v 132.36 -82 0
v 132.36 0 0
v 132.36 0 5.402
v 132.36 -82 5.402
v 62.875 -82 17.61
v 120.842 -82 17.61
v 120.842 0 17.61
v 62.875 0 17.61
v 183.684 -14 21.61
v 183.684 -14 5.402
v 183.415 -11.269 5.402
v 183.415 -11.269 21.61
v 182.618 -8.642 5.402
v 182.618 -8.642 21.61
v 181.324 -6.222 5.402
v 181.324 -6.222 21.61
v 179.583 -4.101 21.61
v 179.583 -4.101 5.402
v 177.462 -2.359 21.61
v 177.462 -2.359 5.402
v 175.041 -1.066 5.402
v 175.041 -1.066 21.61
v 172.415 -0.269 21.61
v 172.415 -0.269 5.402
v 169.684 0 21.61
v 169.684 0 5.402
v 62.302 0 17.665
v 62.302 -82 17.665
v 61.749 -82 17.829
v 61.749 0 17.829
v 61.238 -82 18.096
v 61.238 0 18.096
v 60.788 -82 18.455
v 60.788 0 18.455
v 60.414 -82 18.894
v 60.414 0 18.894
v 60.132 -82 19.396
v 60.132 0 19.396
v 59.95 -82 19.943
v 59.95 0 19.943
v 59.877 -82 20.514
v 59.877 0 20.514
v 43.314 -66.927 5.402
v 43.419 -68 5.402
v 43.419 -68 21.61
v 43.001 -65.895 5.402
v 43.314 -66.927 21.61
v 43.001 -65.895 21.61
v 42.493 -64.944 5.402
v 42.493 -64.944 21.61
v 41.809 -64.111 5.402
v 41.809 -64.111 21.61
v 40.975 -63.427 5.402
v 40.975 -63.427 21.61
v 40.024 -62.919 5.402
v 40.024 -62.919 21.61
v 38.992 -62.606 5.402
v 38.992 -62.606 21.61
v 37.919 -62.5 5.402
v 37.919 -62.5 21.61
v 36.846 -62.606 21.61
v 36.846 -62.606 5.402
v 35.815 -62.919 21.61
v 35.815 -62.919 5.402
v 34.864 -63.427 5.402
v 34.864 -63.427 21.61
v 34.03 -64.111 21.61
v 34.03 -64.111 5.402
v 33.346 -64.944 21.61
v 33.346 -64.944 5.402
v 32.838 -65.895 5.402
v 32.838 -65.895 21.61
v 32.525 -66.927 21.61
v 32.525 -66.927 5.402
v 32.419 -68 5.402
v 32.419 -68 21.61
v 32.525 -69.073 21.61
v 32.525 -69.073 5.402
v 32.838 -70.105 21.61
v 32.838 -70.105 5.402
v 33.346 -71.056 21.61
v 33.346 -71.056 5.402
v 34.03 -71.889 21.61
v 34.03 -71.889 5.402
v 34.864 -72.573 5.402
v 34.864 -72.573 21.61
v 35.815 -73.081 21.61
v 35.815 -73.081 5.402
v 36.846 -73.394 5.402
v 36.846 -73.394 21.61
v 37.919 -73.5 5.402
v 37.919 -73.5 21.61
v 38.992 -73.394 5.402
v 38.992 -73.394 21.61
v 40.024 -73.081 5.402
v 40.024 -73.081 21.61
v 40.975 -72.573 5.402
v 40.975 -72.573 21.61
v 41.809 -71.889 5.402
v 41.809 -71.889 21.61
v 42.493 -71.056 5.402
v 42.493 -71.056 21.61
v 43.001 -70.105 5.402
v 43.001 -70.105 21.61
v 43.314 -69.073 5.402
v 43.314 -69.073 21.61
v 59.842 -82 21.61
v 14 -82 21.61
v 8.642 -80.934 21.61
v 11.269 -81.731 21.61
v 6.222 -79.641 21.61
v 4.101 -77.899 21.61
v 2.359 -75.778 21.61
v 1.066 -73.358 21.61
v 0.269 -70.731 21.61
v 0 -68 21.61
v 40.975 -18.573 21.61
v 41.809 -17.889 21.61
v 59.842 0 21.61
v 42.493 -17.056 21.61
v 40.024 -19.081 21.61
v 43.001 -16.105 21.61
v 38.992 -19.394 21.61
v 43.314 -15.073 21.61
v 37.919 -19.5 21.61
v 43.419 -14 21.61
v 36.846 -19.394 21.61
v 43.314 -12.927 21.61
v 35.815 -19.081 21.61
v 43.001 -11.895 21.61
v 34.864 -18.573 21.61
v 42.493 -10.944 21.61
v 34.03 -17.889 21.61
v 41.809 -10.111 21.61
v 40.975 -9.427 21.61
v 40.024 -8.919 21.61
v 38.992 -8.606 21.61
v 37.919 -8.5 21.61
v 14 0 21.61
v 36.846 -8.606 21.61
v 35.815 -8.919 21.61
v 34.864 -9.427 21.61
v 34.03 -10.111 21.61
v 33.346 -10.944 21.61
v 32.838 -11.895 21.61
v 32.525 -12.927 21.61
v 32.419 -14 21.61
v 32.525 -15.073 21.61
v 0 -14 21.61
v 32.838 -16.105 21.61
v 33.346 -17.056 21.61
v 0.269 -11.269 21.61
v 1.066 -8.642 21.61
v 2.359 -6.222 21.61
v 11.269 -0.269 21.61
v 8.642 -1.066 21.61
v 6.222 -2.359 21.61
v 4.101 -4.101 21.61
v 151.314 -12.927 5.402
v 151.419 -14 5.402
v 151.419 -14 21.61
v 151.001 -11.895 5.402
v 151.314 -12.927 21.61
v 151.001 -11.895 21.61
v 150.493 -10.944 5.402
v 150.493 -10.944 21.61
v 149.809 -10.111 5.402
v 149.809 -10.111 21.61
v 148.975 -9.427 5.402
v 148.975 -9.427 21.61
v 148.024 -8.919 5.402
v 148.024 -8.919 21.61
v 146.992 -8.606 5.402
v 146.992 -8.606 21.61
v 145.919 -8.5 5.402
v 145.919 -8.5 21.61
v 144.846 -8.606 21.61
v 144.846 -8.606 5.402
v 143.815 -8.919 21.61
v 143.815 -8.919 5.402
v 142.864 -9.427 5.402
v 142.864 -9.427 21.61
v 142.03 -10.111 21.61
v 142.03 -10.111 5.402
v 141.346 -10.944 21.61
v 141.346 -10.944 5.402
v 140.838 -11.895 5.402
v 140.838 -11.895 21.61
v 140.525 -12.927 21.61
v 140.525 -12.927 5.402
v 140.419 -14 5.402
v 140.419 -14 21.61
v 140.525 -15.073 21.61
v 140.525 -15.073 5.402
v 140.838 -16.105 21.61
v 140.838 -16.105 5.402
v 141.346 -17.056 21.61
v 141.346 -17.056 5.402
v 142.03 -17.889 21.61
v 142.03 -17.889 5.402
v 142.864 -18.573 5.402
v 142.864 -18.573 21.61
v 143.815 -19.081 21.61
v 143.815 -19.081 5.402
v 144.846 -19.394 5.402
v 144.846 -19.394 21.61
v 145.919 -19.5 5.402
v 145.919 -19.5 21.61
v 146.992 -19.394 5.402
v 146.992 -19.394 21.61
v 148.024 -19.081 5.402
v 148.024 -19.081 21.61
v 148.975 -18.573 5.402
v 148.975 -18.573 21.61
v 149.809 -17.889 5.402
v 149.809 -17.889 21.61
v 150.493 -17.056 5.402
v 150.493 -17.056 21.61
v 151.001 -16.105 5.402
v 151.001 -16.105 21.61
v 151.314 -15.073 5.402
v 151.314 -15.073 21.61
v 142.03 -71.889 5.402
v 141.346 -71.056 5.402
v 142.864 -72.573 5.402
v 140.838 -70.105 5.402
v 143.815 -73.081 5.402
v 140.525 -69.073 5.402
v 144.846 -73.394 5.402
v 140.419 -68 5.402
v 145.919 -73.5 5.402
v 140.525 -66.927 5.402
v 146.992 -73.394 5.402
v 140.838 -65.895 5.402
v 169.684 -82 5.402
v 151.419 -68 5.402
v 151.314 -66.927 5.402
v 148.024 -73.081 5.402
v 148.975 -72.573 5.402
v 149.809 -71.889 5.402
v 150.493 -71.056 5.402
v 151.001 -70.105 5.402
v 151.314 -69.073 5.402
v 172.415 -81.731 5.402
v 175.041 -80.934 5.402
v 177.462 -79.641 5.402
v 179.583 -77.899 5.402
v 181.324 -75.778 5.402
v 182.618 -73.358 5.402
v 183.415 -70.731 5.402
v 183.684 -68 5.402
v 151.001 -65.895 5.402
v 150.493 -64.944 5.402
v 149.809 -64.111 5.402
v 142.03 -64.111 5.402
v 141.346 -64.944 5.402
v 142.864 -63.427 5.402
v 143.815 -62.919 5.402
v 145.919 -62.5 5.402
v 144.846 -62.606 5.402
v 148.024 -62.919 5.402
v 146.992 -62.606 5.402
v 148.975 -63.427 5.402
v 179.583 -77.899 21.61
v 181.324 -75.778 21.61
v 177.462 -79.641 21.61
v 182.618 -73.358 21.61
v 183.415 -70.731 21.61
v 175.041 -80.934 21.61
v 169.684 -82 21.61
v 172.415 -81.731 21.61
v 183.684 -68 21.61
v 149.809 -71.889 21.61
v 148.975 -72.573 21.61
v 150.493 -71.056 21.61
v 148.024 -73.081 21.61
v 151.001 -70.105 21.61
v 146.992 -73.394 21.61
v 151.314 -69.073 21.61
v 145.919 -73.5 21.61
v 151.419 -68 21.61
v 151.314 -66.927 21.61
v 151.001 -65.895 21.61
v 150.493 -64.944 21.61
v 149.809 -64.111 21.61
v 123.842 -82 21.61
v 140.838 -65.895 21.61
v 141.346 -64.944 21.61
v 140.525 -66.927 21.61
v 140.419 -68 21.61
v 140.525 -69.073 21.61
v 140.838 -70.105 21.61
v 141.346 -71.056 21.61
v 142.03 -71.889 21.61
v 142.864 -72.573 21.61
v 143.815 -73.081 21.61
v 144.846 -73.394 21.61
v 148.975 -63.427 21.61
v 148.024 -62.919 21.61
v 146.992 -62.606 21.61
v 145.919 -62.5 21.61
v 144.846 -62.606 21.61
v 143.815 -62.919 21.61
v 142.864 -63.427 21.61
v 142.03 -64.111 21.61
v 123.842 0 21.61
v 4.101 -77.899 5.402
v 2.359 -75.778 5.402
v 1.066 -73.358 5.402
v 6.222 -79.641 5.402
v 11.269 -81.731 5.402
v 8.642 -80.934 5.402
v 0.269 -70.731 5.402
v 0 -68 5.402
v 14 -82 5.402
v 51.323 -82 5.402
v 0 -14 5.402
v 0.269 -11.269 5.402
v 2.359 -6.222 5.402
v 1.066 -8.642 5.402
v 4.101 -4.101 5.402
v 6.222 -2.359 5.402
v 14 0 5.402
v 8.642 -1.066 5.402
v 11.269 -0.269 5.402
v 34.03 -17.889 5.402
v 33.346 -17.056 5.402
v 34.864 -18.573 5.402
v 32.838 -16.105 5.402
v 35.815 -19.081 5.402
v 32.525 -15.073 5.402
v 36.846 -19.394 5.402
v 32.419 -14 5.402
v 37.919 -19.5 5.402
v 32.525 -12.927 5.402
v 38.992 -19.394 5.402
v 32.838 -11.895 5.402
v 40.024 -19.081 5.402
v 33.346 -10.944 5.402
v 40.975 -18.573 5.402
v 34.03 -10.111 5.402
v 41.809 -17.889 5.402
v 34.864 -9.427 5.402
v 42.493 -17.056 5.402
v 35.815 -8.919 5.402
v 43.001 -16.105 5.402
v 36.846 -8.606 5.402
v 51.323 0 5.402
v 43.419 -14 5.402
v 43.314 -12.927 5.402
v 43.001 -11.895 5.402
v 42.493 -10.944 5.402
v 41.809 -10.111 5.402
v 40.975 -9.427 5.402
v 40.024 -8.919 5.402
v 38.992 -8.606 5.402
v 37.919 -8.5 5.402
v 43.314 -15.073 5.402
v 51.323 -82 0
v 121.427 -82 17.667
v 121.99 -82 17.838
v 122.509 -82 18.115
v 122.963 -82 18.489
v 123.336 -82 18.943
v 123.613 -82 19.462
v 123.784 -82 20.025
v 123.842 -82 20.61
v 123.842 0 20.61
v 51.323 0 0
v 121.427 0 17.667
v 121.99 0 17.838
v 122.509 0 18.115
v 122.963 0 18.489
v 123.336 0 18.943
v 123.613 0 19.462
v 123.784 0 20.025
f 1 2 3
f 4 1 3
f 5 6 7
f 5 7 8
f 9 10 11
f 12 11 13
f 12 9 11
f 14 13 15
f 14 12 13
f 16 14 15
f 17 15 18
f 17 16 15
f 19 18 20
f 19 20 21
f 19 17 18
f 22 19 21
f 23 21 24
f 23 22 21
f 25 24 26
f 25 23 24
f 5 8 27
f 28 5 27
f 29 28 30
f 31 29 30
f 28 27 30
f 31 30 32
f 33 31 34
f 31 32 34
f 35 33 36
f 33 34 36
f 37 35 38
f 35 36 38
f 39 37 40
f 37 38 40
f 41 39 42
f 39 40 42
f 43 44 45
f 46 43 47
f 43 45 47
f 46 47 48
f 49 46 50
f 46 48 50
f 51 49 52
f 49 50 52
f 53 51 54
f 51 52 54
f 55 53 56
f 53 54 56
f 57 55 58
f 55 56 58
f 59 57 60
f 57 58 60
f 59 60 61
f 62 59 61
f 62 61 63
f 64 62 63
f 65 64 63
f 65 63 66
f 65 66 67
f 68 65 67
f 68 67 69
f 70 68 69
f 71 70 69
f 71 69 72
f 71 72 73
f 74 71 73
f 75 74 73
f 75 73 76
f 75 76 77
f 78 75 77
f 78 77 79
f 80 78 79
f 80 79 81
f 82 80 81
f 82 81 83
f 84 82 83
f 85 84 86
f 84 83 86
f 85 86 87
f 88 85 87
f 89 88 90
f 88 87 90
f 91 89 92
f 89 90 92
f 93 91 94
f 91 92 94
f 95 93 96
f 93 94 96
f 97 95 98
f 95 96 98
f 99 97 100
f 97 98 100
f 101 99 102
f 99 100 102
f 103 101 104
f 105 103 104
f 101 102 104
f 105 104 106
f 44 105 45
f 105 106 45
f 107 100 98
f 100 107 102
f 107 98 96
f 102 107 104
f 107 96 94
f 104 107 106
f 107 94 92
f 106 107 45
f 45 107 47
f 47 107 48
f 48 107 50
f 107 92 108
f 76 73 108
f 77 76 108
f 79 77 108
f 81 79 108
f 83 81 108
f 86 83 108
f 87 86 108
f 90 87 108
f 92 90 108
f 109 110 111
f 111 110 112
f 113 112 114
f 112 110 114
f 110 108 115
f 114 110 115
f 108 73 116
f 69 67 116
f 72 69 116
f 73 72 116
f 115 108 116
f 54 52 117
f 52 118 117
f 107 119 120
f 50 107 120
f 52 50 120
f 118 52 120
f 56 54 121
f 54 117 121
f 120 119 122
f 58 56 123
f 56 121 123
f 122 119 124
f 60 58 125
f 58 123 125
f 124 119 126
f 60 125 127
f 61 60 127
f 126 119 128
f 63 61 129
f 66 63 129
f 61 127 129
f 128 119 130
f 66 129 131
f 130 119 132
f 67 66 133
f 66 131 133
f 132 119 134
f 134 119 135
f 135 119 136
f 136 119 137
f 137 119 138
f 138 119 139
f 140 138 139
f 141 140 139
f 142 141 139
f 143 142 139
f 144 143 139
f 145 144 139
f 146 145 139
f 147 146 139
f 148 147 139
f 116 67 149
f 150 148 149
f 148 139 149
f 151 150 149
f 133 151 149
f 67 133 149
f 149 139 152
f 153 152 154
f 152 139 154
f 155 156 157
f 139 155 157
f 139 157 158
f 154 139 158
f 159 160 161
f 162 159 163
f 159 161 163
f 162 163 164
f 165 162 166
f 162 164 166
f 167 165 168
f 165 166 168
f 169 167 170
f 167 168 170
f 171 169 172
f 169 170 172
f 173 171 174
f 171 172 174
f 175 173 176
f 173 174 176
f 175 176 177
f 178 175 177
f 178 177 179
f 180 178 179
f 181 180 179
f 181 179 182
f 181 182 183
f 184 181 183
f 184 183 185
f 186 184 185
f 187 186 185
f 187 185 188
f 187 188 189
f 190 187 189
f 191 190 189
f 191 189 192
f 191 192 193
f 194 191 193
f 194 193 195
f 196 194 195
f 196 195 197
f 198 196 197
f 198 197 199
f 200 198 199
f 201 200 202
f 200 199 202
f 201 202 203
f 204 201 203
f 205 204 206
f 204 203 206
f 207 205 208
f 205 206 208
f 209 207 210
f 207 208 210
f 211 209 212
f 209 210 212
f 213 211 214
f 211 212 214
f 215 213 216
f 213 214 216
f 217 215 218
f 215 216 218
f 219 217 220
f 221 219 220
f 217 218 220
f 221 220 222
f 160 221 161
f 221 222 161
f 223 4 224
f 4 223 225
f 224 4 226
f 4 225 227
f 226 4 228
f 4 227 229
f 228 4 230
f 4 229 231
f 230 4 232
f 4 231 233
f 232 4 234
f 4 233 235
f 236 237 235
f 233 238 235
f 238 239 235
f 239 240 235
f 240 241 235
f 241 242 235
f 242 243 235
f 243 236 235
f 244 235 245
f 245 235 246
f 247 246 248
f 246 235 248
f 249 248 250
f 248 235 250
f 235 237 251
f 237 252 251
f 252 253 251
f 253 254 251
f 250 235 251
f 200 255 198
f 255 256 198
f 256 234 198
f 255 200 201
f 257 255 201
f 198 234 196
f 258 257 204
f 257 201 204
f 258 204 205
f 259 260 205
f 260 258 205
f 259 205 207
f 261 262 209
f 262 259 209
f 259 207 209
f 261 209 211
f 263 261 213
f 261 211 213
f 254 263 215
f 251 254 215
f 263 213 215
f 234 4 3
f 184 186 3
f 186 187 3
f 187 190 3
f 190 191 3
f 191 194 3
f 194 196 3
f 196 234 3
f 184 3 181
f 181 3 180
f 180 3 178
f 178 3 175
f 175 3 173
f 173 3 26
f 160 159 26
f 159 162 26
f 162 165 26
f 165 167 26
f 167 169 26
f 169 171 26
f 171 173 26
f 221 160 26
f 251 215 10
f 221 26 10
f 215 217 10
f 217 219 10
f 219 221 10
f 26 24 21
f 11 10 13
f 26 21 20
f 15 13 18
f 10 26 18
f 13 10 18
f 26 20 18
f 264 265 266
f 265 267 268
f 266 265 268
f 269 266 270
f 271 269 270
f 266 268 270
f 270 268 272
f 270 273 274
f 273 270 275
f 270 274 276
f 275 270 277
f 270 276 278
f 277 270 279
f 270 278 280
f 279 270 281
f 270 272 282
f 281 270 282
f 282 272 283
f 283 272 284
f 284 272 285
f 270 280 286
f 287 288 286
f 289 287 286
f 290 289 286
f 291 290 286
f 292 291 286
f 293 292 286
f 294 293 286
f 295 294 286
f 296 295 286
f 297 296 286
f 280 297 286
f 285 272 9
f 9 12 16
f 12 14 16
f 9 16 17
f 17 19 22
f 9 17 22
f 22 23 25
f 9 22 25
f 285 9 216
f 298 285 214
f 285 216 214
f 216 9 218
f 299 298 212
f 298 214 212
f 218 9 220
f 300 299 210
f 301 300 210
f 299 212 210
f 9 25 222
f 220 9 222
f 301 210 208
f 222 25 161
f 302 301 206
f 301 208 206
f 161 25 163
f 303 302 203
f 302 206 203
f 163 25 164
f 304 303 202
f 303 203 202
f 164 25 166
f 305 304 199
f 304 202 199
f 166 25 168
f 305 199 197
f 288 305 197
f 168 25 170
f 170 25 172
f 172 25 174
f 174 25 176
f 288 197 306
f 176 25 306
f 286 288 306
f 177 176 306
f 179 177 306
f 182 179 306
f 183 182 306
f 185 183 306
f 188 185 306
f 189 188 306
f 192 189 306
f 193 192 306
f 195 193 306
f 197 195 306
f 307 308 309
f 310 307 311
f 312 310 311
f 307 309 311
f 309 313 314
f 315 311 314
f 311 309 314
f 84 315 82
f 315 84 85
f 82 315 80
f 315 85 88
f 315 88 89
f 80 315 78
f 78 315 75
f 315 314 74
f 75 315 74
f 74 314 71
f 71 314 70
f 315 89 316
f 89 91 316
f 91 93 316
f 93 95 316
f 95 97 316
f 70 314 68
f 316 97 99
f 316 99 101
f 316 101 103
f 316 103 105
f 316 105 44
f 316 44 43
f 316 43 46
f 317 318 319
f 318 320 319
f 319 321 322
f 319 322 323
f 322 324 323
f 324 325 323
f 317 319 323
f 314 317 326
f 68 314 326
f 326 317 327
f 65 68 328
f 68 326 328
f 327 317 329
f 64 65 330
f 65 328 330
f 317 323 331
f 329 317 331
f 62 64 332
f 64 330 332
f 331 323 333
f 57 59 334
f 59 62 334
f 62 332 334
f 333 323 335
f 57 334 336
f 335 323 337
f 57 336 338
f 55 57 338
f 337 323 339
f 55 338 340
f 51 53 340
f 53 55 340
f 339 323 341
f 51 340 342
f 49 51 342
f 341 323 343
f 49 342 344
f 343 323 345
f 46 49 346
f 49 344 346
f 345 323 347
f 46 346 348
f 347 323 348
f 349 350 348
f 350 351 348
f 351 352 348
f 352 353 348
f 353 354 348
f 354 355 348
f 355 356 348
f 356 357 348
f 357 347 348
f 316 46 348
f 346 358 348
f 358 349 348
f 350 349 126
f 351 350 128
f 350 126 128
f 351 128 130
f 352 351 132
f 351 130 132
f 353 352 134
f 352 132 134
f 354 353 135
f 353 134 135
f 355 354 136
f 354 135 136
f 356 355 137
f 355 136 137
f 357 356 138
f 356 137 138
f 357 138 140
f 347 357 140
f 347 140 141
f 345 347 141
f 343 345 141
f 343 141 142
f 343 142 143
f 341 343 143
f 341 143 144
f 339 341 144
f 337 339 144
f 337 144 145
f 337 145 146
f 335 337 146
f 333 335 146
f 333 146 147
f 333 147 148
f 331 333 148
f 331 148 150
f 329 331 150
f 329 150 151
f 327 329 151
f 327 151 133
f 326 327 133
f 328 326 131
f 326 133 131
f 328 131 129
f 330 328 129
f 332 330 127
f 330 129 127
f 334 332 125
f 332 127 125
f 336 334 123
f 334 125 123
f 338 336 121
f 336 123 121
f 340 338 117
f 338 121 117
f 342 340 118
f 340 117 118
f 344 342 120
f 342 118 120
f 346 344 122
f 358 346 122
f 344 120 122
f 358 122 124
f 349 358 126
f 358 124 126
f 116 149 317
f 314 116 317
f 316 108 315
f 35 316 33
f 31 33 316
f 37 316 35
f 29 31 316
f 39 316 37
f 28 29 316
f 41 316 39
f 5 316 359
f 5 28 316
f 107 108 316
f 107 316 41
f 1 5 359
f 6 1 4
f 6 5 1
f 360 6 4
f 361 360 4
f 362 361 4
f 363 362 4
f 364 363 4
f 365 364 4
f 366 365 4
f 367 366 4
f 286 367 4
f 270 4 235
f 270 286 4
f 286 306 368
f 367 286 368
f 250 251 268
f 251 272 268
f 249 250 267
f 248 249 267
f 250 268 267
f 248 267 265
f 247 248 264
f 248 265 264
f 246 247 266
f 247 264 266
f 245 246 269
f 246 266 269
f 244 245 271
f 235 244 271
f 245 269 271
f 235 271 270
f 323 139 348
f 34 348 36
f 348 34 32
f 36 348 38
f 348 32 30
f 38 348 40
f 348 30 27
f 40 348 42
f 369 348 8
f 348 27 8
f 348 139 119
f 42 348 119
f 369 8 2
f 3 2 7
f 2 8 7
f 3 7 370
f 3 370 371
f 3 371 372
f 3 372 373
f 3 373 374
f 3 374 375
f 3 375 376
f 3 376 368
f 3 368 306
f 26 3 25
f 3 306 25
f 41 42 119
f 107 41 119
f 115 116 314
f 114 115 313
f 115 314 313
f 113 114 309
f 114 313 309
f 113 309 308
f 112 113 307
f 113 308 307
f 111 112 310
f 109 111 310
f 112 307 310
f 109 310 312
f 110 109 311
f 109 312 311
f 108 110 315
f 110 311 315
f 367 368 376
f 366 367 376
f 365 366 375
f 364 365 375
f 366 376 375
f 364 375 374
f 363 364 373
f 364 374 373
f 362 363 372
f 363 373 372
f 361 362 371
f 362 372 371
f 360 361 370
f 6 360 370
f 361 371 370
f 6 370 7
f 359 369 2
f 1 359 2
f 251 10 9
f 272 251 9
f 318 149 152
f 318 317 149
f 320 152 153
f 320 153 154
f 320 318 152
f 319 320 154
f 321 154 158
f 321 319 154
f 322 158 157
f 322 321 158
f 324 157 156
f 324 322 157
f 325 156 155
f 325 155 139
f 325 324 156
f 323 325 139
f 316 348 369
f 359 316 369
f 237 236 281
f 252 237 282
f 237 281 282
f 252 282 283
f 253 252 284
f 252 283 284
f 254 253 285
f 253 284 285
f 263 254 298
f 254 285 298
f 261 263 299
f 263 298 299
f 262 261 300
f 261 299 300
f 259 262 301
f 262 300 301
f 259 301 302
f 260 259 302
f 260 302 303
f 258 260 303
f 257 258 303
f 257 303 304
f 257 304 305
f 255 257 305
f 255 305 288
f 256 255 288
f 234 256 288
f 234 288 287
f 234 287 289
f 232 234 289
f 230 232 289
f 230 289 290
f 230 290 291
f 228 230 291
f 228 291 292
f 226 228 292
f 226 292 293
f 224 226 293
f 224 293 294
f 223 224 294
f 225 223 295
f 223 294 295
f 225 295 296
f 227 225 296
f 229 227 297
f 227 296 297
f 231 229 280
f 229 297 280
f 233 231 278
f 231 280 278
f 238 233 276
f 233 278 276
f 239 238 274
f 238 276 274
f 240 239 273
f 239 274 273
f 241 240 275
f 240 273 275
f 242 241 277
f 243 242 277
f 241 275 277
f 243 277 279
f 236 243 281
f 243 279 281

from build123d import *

# Parameters (mm, degrees)
F1_DEPTH = 82
F2_R     = 14
F3_R     = 5.5
F4_DEPTH = 21.610834


with BuildPart() as f1:
    # F0 (on Front) → F1 (new body)
    with BuildSketch(Plane.XZ):
        with BuildLine():
            Line((0, 21.609834), (0, 5.402458))
            Line((0, 5.402458), (51.323355, 5.402458))
            Line((51.323355, 5.402458), (51.323355, 0))
            Line((51.323355, 0), (132.360232, 0))
            Line((132.360232, 0), (132.360232, 5.402458))
            Line((132.360232, 5.402458), (183.683587, 5.402458))
            Line((183.683587, 5.402458), (183.683587, 21.609834))
            Line((183.683587, 21.609834), (123.841794, 21.609834))
            Line((123.841794, 21.609834), (123.841794, 20.609834))
            ThreePointArc((123.841794, 20.609834), (122.963114, 18.488513), (120.841794, 17.609834))
            Line((120.841794, 17.609834), (62.875107, 17.609834))
            ThreePointArc((62.875107, 17.609834), (60.787768, 18.455068), (59.876622, 20.514491))
            Line((59.876622, 20.514491), (59.841794, 21.609834))
            Line((59.841794, 21.609834), (0, 21.609834))
        make_face()
    extrude(amount=F1_DEPTH)

    # F2
    f2_edges = [f1.edges().sort_by_distance(p)[0] for p in [
        (0, -82, 13.506146),
        (183.683587, -82, 13.506146),
        (183.683587, 0, 13.506146),
        (0, 0, 13.506146),
    ]]
    fillet(f2_edges, radius=F2_R)

    # F3 (on face) → F4 (cut, through all)
    with BuildSketch(Plane.XY.offset(21.609834)):
        with Locations((37.919445, -14)):
            Circle(F3_R)
        with Locations((145.919445, -14)):
            Circle(F3_R)
        with Locations((145.919445, -68)):
            Circle(F3_R)
        with Locations((37.919445, -68)):
            Circle(F3_R)
    extrude(amount=-F4_DEPTH, mode=Mode.SUBTRACT)


solid = f1.part
